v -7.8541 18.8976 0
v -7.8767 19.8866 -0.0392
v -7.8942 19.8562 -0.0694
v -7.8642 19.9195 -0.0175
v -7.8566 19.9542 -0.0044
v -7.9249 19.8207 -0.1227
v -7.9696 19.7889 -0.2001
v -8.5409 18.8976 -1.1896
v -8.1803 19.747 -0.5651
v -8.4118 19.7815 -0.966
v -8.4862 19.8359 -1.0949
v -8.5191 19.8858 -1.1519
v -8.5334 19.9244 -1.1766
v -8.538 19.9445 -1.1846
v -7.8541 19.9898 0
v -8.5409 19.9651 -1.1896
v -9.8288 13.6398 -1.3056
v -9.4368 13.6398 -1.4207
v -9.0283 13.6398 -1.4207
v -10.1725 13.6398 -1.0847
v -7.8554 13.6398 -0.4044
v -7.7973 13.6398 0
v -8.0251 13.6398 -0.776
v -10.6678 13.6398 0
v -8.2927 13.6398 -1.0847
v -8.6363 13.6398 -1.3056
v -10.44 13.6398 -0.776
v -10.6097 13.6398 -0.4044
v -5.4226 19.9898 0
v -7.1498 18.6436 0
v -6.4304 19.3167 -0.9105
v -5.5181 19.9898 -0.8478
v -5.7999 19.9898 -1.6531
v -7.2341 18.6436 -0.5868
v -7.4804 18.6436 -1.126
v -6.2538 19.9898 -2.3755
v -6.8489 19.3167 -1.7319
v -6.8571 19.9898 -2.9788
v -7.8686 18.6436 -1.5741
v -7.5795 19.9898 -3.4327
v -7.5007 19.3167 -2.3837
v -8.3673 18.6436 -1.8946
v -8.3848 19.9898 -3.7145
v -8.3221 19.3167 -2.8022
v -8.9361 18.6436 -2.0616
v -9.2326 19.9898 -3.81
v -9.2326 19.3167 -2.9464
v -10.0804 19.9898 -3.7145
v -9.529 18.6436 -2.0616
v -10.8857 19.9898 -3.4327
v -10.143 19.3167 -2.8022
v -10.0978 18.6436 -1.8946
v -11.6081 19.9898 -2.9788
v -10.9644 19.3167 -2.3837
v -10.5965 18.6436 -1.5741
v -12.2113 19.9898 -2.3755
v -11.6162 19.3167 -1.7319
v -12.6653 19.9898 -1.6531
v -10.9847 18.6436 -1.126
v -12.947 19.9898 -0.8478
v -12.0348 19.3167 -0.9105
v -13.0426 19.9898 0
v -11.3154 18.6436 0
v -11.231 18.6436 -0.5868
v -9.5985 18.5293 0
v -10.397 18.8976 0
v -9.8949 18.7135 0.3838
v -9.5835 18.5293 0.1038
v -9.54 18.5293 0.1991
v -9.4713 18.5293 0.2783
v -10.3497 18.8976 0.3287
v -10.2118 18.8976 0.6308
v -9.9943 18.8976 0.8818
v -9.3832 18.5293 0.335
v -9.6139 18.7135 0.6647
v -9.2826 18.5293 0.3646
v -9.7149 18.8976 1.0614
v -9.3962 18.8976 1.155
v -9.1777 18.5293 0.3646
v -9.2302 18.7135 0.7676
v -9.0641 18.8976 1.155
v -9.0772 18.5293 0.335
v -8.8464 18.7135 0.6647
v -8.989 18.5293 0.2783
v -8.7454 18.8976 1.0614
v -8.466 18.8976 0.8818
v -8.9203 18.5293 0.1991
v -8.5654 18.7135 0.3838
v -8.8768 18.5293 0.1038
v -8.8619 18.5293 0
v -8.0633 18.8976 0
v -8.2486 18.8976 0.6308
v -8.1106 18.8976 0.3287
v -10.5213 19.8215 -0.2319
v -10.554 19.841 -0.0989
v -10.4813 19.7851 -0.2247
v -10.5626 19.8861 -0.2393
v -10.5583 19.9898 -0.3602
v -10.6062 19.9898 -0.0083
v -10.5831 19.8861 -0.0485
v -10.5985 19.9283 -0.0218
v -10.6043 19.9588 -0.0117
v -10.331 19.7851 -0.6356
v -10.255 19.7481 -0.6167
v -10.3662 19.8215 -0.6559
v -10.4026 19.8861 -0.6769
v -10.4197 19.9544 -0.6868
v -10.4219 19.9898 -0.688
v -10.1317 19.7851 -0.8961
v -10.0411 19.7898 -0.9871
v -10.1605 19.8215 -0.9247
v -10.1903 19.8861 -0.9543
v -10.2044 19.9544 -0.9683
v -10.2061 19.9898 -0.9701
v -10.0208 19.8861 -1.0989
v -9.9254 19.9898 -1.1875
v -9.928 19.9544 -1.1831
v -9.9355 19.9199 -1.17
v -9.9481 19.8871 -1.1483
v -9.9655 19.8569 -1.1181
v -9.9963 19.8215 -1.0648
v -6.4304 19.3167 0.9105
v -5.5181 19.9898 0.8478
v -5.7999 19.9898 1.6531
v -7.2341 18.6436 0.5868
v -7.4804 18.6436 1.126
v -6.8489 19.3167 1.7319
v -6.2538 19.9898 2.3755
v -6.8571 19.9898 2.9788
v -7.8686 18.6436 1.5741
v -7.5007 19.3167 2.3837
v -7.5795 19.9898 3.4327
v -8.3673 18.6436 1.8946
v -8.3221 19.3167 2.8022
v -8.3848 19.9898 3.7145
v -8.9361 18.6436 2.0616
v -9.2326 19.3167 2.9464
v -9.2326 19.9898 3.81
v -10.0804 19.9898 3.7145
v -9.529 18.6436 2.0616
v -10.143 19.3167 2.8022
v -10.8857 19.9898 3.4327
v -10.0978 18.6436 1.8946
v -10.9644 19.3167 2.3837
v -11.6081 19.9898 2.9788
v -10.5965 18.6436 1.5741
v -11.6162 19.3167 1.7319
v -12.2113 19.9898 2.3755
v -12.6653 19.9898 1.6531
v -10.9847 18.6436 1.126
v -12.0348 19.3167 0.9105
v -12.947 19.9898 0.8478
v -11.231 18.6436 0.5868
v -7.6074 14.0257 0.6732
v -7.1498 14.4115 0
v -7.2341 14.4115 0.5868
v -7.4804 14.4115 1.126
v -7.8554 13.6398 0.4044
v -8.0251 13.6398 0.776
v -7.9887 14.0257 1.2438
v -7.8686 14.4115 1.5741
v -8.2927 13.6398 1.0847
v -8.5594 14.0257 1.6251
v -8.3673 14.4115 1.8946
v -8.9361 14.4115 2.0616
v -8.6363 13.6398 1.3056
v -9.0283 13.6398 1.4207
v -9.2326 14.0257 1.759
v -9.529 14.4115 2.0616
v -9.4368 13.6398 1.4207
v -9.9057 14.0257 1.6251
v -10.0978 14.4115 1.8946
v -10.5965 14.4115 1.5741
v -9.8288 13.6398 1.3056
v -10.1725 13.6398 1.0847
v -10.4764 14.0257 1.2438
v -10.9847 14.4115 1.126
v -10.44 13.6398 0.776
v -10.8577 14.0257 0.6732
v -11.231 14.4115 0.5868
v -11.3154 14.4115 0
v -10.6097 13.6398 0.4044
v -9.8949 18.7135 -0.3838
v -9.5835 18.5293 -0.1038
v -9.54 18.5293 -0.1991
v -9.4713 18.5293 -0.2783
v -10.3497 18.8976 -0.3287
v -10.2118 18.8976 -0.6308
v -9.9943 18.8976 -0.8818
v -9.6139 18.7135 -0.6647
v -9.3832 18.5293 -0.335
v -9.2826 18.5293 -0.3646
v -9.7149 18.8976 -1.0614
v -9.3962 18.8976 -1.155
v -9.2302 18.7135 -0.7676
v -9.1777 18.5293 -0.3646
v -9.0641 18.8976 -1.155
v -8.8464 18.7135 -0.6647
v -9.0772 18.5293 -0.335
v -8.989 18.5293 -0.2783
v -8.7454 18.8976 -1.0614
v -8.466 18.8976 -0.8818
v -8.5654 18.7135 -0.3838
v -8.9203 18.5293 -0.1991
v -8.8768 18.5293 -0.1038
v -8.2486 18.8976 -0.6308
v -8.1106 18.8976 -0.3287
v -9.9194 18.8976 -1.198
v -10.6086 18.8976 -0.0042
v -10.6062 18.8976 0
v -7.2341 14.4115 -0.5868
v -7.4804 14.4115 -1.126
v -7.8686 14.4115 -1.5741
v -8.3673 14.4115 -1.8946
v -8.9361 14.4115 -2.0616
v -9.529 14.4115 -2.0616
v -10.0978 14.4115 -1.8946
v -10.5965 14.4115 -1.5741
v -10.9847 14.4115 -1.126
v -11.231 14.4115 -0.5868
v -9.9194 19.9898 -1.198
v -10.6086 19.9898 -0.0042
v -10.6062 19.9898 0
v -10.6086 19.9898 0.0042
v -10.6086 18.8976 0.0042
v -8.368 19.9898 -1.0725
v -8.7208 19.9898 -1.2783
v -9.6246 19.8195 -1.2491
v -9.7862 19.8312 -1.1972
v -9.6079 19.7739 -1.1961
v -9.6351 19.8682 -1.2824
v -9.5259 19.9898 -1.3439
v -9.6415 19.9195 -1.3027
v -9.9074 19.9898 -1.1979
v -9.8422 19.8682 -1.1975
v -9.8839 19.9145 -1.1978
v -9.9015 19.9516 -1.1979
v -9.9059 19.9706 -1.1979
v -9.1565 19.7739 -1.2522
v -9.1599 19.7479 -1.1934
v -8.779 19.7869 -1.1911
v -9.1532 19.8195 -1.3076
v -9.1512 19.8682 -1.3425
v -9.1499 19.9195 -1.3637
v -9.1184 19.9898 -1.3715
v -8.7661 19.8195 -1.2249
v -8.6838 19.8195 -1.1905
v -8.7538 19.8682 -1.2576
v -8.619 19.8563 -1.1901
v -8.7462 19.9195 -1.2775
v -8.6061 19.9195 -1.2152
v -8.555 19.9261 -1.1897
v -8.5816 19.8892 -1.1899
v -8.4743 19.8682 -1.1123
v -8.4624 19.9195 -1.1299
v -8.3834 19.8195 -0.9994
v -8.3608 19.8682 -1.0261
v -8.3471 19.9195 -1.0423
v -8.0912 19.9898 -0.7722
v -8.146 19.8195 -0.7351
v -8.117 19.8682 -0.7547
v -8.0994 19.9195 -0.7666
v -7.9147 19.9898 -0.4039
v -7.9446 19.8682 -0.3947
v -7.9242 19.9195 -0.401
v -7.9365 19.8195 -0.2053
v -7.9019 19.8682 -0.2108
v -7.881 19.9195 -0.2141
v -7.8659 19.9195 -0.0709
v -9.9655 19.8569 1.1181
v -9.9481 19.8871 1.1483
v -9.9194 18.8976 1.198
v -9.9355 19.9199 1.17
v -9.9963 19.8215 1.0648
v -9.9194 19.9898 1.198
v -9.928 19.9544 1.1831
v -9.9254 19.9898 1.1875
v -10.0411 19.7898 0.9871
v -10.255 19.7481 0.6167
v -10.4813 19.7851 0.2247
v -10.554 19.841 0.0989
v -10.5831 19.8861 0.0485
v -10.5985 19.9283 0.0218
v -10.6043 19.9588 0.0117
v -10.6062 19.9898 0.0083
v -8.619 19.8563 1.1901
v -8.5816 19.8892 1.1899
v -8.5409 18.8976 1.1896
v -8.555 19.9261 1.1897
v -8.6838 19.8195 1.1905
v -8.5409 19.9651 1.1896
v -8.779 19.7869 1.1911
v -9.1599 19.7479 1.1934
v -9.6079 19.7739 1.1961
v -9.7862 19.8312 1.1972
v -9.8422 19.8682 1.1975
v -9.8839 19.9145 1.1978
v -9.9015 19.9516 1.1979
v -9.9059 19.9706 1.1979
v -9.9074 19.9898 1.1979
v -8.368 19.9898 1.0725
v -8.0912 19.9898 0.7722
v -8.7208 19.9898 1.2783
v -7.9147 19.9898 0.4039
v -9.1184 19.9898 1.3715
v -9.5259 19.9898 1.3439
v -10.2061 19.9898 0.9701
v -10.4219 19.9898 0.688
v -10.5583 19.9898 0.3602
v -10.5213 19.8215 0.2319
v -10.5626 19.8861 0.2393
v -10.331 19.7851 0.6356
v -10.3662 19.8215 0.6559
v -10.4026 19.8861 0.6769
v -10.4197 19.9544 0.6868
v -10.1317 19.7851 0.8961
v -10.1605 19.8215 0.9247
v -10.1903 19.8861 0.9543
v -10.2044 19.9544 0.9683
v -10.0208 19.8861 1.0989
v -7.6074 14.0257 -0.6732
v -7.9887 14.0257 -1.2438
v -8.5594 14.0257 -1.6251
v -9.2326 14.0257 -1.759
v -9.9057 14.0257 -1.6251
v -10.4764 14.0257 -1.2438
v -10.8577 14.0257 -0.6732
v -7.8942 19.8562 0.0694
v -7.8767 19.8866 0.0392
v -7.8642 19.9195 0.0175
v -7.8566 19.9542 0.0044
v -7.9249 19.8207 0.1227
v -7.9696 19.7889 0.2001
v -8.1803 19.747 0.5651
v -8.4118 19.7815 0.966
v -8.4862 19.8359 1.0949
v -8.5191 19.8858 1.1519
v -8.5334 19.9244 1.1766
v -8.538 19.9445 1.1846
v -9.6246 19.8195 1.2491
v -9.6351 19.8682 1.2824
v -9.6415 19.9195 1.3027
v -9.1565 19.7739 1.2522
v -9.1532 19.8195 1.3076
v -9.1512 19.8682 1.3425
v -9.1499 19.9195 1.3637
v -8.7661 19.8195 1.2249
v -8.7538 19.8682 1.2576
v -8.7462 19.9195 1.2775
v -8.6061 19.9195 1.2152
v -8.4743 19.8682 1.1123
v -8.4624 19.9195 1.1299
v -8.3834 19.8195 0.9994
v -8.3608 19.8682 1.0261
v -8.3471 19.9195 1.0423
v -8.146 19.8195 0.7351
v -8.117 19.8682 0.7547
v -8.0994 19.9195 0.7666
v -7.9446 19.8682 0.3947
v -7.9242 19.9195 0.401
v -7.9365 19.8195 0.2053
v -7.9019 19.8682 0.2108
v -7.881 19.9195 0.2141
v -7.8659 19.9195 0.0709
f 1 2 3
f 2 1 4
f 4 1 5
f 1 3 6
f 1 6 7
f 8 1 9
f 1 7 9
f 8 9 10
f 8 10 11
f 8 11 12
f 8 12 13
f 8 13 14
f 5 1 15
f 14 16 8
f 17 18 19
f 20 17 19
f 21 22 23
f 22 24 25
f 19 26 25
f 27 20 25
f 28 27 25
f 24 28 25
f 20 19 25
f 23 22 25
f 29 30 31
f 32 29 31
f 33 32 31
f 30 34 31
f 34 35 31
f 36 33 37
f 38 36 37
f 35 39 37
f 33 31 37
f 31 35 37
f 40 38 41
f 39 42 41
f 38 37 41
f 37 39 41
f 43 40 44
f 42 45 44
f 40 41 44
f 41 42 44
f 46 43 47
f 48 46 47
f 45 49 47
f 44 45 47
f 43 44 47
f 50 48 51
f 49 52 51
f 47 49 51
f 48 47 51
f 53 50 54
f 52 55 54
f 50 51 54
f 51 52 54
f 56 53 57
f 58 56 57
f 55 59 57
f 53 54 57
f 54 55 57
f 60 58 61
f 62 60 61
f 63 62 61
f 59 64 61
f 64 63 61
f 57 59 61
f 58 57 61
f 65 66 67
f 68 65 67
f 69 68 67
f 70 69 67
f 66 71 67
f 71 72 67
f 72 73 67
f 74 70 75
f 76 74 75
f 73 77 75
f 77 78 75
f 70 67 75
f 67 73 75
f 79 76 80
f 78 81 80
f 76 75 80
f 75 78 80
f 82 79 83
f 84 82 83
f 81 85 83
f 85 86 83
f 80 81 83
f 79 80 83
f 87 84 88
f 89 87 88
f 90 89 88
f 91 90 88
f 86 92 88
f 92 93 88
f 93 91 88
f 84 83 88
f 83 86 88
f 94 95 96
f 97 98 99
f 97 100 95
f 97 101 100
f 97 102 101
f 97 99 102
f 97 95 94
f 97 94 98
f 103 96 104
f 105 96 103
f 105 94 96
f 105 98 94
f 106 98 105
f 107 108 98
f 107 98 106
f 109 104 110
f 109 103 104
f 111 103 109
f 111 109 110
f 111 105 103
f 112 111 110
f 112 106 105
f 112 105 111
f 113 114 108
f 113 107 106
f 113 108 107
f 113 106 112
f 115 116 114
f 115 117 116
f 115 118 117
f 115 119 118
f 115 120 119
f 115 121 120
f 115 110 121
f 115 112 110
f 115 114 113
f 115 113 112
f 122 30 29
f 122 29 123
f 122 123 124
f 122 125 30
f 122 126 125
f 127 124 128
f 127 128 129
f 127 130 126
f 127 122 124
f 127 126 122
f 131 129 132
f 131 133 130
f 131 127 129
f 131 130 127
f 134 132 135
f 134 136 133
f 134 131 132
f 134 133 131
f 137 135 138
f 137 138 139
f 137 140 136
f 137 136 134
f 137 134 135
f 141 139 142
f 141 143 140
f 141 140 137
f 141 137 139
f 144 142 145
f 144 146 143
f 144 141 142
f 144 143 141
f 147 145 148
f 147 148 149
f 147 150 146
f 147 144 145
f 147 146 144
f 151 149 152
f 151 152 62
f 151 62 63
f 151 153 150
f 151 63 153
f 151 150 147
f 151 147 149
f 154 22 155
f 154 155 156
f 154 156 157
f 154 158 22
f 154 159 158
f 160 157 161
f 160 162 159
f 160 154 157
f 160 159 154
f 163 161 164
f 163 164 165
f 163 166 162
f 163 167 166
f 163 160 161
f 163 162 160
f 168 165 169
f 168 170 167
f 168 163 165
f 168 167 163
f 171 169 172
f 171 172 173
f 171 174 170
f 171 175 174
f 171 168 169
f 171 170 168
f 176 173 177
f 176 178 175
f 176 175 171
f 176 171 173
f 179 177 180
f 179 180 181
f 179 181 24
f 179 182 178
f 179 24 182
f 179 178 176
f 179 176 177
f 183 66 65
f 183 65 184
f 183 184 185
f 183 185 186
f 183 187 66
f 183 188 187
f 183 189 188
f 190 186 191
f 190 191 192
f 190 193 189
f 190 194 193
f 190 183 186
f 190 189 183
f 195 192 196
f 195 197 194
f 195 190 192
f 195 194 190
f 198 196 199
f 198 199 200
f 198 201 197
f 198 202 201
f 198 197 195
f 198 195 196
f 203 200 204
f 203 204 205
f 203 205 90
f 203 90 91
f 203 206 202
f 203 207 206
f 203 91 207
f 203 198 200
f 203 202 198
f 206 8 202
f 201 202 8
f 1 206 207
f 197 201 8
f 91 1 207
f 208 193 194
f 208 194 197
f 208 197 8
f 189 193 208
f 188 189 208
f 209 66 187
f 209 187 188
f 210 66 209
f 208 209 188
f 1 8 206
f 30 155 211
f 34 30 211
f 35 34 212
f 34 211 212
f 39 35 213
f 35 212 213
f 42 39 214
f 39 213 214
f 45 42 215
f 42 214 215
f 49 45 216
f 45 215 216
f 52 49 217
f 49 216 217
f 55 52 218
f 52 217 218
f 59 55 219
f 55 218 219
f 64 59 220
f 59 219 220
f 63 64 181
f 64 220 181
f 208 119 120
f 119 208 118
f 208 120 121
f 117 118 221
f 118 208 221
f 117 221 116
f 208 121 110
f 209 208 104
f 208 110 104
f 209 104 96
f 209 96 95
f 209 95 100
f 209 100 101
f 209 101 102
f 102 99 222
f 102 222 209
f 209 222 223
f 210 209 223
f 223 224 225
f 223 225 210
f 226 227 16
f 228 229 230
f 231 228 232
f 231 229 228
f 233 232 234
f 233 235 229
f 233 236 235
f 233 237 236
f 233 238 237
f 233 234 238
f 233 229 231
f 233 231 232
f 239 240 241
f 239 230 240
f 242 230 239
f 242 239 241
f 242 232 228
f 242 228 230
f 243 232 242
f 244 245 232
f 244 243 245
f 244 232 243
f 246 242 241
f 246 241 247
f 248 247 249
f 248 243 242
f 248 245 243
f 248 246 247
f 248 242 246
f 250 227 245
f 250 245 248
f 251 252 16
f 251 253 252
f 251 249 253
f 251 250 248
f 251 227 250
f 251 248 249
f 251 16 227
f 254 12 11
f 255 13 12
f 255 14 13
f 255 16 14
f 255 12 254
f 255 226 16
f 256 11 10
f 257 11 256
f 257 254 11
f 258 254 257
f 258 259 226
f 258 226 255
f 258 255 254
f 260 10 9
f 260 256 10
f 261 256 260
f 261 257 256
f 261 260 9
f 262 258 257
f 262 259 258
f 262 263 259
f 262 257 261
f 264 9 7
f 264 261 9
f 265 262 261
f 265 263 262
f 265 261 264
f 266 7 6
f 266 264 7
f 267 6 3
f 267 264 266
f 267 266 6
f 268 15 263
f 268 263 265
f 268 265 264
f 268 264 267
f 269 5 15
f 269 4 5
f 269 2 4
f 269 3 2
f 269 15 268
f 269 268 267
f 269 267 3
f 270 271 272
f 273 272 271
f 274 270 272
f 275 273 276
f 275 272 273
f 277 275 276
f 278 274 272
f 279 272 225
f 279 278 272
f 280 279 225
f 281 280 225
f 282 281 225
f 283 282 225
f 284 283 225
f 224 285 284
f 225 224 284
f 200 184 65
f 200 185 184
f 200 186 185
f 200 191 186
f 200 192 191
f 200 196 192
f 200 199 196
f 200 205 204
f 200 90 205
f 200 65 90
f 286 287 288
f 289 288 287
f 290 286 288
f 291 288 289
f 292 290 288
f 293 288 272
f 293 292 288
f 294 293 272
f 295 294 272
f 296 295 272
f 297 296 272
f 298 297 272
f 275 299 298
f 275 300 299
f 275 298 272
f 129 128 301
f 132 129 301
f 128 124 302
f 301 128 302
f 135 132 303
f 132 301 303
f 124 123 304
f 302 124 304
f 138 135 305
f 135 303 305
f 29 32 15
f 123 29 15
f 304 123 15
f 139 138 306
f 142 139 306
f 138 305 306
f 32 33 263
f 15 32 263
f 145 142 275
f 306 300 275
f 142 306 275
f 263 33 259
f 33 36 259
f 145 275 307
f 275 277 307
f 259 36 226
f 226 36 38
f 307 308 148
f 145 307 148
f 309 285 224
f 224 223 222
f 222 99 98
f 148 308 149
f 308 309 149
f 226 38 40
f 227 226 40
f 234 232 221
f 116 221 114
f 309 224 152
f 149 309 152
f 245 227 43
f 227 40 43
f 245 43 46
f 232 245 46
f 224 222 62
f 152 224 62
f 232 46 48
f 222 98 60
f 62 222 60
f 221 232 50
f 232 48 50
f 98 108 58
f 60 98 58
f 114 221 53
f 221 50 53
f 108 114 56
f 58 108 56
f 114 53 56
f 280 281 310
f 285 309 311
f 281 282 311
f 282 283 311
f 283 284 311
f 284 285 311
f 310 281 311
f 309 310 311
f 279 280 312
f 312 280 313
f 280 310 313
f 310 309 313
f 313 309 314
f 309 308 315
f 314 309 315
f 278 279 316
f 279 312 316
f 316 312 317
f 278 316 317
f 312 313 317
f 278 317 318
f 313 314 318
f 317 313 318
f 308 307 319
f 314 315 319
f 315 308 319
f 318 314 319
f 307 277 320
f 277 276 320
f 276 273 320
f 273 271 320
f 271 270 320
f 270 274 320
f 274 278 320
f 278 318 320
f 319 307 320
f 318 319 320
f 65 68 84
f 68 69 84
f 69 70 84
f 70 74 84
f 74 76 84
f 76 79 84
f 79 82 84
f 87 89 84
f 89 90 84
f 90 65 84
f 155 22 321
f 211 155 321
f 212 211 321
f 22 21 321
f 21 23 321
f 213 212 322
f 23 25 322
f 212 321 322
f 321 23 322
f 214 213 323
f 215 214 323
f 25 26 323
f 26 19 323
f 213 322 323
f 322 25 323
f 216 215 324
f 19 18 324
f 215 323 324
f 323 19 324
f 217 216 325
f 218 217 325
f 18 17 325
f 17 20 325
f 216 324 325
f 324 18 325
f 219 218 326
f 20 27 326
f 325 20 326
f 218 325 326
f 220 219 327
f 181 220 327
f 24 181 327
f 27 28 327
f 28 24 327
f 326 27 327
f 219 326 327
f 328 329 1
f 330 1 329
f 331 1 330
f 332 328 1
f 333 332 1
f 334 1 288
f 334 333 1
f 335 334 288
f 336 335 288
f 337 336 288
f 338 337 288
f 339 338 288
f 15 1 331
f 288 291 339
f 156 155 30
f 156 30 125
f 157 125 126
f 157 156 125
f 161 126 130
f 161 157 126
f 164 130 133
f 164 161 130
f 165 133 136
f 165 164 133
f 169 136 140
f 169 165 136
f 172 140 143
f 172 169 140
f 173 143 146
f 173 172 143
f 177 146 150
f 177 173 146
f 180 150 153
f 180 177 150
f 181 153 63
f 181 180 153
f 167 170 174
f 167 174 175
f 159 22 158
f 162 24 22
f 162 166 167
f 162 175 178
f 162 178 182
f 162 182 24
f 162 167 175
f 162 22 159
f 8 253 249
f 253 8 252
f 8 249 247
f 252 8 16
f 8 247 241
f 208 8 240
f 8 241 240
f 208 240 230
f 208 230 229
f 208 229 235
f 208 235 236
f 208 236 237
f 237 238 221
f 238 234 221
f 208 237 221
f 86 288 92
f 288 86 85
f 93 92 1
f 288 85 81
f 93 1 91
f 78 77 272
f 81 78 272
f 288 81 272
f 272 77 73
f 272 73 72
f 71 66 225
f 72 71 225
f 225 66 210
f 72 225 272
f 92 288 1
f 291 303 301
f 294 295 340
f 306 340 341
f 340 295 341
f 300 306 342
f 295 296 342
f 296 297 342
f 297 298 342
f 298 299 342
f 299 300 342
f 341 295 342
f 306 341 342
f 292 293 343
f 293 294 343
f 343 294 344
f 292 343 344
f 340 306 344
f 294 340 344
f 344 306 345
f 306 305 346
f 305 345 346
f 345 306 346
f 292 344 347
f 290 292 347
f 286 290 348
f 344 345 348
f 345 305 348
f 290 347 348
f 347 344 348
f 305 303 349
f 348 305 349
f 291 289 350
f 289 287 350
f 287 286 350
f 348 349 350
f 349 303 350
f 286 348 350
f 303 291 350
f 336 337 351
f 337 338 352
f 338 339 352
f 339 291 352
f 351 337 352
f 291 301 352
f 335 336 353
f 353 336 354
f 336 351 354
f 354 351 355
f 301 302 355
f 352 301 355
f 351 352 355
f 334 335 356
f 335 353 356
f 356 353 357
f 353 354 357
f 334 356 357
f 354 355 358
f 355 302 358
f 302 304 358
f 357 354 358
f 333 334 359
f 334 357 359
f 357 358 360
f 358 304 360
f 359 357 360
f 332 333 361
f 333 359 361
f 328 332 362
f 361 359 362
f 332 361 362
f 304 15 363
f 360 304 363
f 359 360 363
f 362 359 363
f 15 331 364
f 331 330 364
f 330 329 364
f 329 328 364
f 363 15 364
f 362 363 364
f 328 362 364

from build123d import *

# Parameters (mm, degrees)
CUT_EXTRUDE1_DEPTH = 1.0922
CUT_EXTRUDE2_DEPTH = 7.35


with BuildPart() as part:
    # Sketch1 → Revolve1 (revolve)
    with BuildSketch(Plane.XY):
        Polygon((-9.232559292, 19.989816719), (-5.422559292, 19.989816719), (-7.149759292, 18.643616719), (-7.149759292, 14.411514199), (-7.797290363, 13.639816719), (-9.232559292, 13.639816719), align=None)
    revolve(axis=Axis((-9.232559292, 19.989816719, 0), (0, -1, 0)))

    # Sketch2 → Cut-Extrude1 (cut)
    with BuildSketch(Plane(origin=(0, 19.989816719, 0), x_dir=(1, 0, 0), z_dir=(0, 1, 0))):
        Polygon((-9.926643575, 1.1938), (-8.548145113, 1.1938), (-7.851656024, 0.004194621), (-8.540905254, -1.189620065), (-9.919378278, -1.197994621), (-10.608627508, -0.004179935), align=None)
    extrude(amount=-CUT_EXTRUDE1_DEPTH, mode=Mode.SUBTRACT)

    # Sketch4 → Cut-Extrude2 (cut, through all)
    with BuildSketch(Plane(origin=(0, 19.989816719, 0), x_dir=(1, 0, 0), z_dir=(0, 1, 0))):
        Polygon((-13.85844337, 0), (-4.15558518, 0), (-6.419880254, 3.714859107), (-9.922461698, 4.192483849), (-13.787684149, 2.78614433), align=None)
    extrude(amount=-CUT_EXTRUDE2_DEPTH, mode=Mode.SUBTRACT)

    # Sketch5 → Cut-Revolve1 (revolve, cut)
    with BuildSketch(Plane(origin=(0, 0, 0), x_dir=(-1, 0, 0), z_dir=(0, 0, -1))):
        with BuildLine():
            Line((9.230162876, 18.529316719), (9.598462876, 18.529316719))
            Line((9.598462876, 18.529316719), (10.39700559, 18.897616719))
            Line((10.39700559, 18.897616719), (10.39700559, 19.741247113))
            ThreePointArc((10.39700559, 19.741247113), (10.546973564, 19.827359633), (10.606247963, 19.989816719))
            Line((10.606247963, 19.989816719), (10.353982568, 19.989816719))
            Line((10.353982568, 19.989816719), (9.230162876, 19.989816719))
            Line((9.230162876, 19.989816719), (9.230162876, 18.529316719))
        make_face()
    revolve(axis=Axis((-9.230162876, 18.897616719, 0), (0, 1, 0)), mode=Mode.SUBTRACT)

    # Mirror1: part across plane


with BuildPart() as part_1:
    add(part.part)
    add(part.part.mirror(Plane(origin=(-13.85844337, 13.639816719, 0), x_dir=(1, 0, 0), z_dir=(0, 0, 1))))


solid = part_1.part
